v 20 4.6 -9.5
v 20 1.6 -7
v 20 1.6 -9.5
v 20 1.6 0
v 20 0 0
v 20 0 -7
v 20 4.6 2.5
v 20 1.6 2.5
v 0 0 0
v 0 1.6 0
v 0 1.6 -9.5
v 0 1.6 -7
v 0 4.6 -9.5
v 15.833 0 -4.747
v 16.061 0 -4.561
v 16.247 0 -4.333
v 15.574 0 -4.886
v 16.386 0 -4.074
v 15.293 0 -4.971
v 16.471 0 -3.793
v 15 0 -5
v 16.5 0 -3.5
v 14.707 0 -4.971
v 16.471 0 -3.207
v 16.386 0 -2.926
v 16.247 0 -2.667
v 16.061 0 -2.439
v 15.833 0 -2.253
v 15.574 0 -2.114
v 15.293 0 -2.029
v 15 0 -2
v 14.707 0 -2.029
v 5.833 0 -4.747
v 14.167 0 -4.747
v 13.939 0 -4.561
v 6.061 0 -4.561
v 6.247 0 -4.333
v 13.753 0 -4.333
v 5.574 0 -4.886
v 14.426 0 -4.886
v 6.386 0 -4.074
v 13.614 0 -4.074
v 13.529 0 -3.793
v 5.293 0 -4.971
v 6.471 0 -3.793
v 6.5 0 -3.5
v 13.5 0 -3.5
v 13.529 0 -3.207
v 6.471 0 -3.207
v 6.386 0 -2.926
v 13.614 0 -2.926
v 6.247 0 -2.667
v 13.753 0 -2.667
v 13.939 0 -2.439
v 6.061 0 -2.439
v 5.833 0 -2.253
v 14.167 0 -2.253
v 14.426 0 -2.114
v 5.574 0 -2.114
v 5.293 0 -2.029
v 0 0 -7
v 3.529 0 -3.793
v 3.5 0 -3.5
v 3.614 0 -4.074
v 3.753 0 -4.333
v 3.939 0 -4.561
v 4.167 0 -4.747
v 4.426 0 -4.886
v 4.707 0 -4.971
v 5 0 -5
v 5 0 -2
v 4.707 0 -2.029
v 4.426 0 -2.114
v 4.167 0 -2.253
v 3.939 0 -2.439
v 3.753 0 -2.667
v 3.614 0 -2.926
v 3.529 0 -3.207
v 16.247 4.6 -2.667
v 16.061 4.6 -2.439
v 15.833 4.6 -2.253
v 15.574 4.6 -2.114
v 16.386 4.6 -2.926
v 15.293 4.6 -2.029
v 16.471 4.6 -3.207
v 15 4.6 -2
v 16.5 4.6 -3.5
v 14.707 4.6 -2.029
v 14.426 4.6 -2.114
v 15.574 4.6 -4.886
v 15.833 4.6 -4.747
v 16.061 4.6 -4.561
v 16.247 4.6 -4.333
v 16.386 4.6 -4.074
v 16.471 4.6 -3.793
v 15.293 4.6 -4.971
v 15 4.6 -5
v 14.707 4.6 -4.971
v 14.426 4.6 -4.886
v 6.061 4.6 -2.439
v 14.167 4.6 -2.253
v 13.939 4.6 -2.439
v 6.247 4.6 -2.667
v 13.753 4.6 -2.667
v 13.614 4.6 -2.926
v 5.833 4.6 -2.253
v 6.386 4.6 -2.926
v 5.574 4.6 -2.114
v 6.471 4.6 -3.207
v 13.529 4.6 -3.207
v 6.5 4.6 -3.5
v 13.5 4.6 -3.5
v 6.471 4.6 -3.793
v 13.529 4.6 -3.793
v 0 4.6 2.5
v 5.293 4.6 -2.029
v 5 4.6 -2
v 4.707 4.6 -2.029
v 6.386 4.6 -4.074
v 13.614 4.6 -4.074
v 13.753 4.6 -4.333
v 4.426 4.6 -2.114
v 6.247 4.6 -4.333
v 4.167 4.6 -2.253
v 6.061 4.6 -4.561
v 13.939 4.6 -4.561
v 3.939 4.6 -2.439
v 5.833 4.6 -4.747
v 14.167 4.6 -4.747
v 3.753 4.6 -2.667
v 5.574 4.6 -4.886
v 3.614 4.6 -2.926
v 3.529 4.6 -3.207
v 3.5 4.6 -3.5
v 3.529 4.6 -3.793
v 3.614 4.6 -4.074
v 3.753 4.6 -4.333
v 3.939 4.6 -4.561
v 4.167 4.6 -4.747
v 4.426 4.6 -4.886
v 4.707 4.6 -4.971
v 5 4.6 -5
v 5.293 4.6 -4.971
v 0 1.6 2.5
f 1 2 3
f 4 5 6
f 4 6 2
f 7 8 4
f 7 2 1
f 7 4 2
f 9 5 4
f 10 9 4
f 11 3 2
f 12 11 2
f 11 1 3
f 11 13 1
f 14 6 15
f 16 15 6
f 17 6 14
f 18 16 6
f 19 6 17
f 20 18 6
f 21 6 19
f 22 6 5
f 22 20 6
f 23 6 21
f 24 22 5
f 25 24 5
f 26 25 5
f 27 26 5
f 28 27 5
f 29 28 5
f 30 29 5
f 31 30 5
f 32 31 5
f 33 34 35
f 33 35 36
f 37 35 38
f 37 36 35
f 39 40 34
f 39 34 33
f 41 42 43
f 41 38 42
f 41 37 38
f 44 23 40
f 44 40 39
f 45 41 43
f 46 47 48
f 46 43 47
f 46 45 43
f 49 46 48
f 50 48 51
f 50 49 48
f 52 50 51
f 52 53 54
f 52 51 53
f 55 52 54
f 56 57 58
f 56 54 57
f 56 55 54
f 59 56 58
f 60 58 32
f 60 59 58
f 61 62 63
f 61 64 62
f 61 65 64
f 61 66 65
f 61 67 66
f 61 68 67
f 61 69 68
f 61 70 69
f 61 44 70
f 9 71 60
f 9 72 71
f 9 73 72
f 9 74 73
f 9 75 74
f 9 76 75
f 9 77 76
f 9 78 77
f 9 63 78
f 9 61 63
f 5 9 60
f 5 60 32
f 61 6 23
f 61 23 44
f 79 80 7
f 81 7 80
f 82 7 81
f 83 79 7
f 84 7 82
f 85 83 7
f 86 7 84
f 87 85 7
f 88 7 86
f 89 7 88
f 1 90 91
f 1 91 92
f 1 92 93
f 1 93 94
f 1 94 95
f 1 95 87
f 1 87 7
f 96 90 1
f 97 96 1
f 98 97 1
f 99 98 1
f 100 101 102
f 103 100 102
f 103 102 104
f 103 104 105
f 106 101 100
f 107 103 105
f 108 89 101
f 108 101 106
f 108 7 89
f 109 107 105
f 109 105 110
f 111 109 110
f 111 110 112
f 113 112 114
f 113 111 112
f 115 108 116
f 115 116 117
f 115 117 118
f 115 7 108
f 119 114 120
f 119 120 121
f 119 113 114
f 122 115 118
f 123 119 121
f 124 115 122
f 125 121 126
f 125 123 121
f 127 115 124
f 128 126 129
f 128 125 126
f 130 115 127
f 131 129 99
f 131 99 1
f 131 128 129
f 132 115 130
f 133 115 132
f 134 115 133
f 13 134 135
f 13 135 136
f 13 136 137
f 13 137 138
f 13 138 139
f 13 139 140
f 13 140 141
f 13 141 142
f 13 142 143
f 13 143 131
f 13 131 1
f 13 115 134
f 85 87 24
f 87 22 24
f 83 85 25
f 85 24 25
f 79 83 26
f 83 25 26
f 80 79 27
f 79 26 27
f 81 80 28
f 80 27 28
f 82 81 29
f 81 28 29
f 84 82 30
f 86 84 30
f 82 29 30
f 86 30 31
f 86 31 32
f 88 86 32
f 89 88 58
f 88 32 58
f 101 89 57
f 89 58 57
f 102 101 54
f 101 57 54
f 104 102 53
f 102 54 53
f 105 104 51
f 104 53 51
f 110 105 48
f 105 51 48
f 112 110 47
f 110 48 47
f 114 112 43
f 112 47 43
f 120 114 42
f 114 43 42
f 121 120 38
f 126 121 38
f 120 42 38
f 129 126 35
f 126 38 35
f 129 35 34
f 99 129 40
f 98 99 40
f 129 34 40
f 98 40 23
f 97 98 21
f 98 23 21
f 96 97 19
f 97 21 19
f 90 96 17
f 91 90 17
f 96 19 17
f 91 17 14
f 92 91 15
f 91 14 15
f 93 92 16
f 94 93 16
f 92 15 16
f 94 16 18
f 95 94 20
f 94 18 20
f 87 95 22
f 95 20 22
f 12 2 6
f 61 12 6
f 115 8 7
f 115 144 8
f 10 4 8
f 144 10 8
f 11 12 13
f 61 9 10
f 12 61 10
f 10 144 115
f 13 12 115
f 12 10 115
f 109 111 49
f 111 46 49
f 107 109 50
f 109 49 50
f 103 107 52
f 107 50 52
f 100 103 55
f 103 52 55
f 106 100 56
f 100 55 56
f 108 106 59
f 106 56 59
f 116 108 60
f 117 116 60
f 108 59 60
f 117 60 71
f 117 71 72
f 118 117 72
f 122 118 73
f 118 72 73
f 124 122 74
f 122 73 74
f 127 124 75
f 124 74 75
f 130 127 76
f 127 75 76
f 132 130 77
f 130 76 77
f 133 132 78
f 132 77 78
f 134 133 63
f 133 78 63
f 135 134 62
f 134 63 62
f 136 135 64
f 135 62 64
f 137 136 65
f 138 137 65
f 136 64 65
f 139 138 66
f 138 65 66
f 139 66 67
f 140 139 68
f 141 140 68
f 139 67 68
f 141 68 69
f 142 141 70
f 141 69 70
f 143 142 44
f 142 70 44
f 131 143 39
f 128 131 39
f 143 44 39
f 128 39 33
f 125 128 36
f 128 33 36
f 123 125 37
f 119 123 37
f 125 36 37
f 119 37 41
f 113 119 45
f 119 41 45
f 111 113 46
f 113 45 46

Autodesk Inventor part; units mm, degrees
ref_plane "YZ Plane" through (0, 0, 0) normal (1, 0, 0) x (0, 1, 0)
ref_plane "XZ Plane" through (0, 0, 0) normal (0, 1, 0) x (-1, 0, 0)
ref_plane "XY Plane" through (0, 0, 0) normal (0, 0, 1) x (1, 0, 0)
sketch "スケッチ1" plane through (0, 0, 0) normal (1, 0, 0) x (0, 1, 0)
  line L0 (0, 0) -> (1.6, 0)
  line L1 (1.6, 0) -> (1.6, 2.5)
  line L2 (1.6, 2.5) -> (4.6, 2.5)
  line L3 (4.6, 2.5) -> (4.6, -9.5)
  line L4 (4.6, -9.5) -> (1.6, -9.5)
  line L5 (1.6, -9.5) -> (1.6, -7)
  line L6 (1.6, -7) -> (0, -7)
  line L7 (0, -7) -> (0, 0)
  dimension "d0" = 4.6
  dimension "d1" = 7
  dimension "d2" = 12
  dimension "d3" = 2.5
  dimension "d4" = 3
extrude "押し出し1" add sketch "スケッチ1" along normal blind 20
sketch "スケッチ2" plane through (0, 0, -7) normal (0, -1, 0) x (1, 0, 0)
  circle A0 centre (5, 3.5) radius 1.5
  circle A1 centre (15, 3.5) radius 1.5
  line L0 (0, 0) -> (0, 7) projected
  point P0 (0, 3.5)
  dimension "d7" = 3
  dimension "d8" = 3
  dimension "d9" = 5
  dimension "d10" = 10
extrude "押し出し2" cut sketch "スケッチ2" against normal through all
properties part number "slider2b" material "アルミニウム 6061-AHC"
